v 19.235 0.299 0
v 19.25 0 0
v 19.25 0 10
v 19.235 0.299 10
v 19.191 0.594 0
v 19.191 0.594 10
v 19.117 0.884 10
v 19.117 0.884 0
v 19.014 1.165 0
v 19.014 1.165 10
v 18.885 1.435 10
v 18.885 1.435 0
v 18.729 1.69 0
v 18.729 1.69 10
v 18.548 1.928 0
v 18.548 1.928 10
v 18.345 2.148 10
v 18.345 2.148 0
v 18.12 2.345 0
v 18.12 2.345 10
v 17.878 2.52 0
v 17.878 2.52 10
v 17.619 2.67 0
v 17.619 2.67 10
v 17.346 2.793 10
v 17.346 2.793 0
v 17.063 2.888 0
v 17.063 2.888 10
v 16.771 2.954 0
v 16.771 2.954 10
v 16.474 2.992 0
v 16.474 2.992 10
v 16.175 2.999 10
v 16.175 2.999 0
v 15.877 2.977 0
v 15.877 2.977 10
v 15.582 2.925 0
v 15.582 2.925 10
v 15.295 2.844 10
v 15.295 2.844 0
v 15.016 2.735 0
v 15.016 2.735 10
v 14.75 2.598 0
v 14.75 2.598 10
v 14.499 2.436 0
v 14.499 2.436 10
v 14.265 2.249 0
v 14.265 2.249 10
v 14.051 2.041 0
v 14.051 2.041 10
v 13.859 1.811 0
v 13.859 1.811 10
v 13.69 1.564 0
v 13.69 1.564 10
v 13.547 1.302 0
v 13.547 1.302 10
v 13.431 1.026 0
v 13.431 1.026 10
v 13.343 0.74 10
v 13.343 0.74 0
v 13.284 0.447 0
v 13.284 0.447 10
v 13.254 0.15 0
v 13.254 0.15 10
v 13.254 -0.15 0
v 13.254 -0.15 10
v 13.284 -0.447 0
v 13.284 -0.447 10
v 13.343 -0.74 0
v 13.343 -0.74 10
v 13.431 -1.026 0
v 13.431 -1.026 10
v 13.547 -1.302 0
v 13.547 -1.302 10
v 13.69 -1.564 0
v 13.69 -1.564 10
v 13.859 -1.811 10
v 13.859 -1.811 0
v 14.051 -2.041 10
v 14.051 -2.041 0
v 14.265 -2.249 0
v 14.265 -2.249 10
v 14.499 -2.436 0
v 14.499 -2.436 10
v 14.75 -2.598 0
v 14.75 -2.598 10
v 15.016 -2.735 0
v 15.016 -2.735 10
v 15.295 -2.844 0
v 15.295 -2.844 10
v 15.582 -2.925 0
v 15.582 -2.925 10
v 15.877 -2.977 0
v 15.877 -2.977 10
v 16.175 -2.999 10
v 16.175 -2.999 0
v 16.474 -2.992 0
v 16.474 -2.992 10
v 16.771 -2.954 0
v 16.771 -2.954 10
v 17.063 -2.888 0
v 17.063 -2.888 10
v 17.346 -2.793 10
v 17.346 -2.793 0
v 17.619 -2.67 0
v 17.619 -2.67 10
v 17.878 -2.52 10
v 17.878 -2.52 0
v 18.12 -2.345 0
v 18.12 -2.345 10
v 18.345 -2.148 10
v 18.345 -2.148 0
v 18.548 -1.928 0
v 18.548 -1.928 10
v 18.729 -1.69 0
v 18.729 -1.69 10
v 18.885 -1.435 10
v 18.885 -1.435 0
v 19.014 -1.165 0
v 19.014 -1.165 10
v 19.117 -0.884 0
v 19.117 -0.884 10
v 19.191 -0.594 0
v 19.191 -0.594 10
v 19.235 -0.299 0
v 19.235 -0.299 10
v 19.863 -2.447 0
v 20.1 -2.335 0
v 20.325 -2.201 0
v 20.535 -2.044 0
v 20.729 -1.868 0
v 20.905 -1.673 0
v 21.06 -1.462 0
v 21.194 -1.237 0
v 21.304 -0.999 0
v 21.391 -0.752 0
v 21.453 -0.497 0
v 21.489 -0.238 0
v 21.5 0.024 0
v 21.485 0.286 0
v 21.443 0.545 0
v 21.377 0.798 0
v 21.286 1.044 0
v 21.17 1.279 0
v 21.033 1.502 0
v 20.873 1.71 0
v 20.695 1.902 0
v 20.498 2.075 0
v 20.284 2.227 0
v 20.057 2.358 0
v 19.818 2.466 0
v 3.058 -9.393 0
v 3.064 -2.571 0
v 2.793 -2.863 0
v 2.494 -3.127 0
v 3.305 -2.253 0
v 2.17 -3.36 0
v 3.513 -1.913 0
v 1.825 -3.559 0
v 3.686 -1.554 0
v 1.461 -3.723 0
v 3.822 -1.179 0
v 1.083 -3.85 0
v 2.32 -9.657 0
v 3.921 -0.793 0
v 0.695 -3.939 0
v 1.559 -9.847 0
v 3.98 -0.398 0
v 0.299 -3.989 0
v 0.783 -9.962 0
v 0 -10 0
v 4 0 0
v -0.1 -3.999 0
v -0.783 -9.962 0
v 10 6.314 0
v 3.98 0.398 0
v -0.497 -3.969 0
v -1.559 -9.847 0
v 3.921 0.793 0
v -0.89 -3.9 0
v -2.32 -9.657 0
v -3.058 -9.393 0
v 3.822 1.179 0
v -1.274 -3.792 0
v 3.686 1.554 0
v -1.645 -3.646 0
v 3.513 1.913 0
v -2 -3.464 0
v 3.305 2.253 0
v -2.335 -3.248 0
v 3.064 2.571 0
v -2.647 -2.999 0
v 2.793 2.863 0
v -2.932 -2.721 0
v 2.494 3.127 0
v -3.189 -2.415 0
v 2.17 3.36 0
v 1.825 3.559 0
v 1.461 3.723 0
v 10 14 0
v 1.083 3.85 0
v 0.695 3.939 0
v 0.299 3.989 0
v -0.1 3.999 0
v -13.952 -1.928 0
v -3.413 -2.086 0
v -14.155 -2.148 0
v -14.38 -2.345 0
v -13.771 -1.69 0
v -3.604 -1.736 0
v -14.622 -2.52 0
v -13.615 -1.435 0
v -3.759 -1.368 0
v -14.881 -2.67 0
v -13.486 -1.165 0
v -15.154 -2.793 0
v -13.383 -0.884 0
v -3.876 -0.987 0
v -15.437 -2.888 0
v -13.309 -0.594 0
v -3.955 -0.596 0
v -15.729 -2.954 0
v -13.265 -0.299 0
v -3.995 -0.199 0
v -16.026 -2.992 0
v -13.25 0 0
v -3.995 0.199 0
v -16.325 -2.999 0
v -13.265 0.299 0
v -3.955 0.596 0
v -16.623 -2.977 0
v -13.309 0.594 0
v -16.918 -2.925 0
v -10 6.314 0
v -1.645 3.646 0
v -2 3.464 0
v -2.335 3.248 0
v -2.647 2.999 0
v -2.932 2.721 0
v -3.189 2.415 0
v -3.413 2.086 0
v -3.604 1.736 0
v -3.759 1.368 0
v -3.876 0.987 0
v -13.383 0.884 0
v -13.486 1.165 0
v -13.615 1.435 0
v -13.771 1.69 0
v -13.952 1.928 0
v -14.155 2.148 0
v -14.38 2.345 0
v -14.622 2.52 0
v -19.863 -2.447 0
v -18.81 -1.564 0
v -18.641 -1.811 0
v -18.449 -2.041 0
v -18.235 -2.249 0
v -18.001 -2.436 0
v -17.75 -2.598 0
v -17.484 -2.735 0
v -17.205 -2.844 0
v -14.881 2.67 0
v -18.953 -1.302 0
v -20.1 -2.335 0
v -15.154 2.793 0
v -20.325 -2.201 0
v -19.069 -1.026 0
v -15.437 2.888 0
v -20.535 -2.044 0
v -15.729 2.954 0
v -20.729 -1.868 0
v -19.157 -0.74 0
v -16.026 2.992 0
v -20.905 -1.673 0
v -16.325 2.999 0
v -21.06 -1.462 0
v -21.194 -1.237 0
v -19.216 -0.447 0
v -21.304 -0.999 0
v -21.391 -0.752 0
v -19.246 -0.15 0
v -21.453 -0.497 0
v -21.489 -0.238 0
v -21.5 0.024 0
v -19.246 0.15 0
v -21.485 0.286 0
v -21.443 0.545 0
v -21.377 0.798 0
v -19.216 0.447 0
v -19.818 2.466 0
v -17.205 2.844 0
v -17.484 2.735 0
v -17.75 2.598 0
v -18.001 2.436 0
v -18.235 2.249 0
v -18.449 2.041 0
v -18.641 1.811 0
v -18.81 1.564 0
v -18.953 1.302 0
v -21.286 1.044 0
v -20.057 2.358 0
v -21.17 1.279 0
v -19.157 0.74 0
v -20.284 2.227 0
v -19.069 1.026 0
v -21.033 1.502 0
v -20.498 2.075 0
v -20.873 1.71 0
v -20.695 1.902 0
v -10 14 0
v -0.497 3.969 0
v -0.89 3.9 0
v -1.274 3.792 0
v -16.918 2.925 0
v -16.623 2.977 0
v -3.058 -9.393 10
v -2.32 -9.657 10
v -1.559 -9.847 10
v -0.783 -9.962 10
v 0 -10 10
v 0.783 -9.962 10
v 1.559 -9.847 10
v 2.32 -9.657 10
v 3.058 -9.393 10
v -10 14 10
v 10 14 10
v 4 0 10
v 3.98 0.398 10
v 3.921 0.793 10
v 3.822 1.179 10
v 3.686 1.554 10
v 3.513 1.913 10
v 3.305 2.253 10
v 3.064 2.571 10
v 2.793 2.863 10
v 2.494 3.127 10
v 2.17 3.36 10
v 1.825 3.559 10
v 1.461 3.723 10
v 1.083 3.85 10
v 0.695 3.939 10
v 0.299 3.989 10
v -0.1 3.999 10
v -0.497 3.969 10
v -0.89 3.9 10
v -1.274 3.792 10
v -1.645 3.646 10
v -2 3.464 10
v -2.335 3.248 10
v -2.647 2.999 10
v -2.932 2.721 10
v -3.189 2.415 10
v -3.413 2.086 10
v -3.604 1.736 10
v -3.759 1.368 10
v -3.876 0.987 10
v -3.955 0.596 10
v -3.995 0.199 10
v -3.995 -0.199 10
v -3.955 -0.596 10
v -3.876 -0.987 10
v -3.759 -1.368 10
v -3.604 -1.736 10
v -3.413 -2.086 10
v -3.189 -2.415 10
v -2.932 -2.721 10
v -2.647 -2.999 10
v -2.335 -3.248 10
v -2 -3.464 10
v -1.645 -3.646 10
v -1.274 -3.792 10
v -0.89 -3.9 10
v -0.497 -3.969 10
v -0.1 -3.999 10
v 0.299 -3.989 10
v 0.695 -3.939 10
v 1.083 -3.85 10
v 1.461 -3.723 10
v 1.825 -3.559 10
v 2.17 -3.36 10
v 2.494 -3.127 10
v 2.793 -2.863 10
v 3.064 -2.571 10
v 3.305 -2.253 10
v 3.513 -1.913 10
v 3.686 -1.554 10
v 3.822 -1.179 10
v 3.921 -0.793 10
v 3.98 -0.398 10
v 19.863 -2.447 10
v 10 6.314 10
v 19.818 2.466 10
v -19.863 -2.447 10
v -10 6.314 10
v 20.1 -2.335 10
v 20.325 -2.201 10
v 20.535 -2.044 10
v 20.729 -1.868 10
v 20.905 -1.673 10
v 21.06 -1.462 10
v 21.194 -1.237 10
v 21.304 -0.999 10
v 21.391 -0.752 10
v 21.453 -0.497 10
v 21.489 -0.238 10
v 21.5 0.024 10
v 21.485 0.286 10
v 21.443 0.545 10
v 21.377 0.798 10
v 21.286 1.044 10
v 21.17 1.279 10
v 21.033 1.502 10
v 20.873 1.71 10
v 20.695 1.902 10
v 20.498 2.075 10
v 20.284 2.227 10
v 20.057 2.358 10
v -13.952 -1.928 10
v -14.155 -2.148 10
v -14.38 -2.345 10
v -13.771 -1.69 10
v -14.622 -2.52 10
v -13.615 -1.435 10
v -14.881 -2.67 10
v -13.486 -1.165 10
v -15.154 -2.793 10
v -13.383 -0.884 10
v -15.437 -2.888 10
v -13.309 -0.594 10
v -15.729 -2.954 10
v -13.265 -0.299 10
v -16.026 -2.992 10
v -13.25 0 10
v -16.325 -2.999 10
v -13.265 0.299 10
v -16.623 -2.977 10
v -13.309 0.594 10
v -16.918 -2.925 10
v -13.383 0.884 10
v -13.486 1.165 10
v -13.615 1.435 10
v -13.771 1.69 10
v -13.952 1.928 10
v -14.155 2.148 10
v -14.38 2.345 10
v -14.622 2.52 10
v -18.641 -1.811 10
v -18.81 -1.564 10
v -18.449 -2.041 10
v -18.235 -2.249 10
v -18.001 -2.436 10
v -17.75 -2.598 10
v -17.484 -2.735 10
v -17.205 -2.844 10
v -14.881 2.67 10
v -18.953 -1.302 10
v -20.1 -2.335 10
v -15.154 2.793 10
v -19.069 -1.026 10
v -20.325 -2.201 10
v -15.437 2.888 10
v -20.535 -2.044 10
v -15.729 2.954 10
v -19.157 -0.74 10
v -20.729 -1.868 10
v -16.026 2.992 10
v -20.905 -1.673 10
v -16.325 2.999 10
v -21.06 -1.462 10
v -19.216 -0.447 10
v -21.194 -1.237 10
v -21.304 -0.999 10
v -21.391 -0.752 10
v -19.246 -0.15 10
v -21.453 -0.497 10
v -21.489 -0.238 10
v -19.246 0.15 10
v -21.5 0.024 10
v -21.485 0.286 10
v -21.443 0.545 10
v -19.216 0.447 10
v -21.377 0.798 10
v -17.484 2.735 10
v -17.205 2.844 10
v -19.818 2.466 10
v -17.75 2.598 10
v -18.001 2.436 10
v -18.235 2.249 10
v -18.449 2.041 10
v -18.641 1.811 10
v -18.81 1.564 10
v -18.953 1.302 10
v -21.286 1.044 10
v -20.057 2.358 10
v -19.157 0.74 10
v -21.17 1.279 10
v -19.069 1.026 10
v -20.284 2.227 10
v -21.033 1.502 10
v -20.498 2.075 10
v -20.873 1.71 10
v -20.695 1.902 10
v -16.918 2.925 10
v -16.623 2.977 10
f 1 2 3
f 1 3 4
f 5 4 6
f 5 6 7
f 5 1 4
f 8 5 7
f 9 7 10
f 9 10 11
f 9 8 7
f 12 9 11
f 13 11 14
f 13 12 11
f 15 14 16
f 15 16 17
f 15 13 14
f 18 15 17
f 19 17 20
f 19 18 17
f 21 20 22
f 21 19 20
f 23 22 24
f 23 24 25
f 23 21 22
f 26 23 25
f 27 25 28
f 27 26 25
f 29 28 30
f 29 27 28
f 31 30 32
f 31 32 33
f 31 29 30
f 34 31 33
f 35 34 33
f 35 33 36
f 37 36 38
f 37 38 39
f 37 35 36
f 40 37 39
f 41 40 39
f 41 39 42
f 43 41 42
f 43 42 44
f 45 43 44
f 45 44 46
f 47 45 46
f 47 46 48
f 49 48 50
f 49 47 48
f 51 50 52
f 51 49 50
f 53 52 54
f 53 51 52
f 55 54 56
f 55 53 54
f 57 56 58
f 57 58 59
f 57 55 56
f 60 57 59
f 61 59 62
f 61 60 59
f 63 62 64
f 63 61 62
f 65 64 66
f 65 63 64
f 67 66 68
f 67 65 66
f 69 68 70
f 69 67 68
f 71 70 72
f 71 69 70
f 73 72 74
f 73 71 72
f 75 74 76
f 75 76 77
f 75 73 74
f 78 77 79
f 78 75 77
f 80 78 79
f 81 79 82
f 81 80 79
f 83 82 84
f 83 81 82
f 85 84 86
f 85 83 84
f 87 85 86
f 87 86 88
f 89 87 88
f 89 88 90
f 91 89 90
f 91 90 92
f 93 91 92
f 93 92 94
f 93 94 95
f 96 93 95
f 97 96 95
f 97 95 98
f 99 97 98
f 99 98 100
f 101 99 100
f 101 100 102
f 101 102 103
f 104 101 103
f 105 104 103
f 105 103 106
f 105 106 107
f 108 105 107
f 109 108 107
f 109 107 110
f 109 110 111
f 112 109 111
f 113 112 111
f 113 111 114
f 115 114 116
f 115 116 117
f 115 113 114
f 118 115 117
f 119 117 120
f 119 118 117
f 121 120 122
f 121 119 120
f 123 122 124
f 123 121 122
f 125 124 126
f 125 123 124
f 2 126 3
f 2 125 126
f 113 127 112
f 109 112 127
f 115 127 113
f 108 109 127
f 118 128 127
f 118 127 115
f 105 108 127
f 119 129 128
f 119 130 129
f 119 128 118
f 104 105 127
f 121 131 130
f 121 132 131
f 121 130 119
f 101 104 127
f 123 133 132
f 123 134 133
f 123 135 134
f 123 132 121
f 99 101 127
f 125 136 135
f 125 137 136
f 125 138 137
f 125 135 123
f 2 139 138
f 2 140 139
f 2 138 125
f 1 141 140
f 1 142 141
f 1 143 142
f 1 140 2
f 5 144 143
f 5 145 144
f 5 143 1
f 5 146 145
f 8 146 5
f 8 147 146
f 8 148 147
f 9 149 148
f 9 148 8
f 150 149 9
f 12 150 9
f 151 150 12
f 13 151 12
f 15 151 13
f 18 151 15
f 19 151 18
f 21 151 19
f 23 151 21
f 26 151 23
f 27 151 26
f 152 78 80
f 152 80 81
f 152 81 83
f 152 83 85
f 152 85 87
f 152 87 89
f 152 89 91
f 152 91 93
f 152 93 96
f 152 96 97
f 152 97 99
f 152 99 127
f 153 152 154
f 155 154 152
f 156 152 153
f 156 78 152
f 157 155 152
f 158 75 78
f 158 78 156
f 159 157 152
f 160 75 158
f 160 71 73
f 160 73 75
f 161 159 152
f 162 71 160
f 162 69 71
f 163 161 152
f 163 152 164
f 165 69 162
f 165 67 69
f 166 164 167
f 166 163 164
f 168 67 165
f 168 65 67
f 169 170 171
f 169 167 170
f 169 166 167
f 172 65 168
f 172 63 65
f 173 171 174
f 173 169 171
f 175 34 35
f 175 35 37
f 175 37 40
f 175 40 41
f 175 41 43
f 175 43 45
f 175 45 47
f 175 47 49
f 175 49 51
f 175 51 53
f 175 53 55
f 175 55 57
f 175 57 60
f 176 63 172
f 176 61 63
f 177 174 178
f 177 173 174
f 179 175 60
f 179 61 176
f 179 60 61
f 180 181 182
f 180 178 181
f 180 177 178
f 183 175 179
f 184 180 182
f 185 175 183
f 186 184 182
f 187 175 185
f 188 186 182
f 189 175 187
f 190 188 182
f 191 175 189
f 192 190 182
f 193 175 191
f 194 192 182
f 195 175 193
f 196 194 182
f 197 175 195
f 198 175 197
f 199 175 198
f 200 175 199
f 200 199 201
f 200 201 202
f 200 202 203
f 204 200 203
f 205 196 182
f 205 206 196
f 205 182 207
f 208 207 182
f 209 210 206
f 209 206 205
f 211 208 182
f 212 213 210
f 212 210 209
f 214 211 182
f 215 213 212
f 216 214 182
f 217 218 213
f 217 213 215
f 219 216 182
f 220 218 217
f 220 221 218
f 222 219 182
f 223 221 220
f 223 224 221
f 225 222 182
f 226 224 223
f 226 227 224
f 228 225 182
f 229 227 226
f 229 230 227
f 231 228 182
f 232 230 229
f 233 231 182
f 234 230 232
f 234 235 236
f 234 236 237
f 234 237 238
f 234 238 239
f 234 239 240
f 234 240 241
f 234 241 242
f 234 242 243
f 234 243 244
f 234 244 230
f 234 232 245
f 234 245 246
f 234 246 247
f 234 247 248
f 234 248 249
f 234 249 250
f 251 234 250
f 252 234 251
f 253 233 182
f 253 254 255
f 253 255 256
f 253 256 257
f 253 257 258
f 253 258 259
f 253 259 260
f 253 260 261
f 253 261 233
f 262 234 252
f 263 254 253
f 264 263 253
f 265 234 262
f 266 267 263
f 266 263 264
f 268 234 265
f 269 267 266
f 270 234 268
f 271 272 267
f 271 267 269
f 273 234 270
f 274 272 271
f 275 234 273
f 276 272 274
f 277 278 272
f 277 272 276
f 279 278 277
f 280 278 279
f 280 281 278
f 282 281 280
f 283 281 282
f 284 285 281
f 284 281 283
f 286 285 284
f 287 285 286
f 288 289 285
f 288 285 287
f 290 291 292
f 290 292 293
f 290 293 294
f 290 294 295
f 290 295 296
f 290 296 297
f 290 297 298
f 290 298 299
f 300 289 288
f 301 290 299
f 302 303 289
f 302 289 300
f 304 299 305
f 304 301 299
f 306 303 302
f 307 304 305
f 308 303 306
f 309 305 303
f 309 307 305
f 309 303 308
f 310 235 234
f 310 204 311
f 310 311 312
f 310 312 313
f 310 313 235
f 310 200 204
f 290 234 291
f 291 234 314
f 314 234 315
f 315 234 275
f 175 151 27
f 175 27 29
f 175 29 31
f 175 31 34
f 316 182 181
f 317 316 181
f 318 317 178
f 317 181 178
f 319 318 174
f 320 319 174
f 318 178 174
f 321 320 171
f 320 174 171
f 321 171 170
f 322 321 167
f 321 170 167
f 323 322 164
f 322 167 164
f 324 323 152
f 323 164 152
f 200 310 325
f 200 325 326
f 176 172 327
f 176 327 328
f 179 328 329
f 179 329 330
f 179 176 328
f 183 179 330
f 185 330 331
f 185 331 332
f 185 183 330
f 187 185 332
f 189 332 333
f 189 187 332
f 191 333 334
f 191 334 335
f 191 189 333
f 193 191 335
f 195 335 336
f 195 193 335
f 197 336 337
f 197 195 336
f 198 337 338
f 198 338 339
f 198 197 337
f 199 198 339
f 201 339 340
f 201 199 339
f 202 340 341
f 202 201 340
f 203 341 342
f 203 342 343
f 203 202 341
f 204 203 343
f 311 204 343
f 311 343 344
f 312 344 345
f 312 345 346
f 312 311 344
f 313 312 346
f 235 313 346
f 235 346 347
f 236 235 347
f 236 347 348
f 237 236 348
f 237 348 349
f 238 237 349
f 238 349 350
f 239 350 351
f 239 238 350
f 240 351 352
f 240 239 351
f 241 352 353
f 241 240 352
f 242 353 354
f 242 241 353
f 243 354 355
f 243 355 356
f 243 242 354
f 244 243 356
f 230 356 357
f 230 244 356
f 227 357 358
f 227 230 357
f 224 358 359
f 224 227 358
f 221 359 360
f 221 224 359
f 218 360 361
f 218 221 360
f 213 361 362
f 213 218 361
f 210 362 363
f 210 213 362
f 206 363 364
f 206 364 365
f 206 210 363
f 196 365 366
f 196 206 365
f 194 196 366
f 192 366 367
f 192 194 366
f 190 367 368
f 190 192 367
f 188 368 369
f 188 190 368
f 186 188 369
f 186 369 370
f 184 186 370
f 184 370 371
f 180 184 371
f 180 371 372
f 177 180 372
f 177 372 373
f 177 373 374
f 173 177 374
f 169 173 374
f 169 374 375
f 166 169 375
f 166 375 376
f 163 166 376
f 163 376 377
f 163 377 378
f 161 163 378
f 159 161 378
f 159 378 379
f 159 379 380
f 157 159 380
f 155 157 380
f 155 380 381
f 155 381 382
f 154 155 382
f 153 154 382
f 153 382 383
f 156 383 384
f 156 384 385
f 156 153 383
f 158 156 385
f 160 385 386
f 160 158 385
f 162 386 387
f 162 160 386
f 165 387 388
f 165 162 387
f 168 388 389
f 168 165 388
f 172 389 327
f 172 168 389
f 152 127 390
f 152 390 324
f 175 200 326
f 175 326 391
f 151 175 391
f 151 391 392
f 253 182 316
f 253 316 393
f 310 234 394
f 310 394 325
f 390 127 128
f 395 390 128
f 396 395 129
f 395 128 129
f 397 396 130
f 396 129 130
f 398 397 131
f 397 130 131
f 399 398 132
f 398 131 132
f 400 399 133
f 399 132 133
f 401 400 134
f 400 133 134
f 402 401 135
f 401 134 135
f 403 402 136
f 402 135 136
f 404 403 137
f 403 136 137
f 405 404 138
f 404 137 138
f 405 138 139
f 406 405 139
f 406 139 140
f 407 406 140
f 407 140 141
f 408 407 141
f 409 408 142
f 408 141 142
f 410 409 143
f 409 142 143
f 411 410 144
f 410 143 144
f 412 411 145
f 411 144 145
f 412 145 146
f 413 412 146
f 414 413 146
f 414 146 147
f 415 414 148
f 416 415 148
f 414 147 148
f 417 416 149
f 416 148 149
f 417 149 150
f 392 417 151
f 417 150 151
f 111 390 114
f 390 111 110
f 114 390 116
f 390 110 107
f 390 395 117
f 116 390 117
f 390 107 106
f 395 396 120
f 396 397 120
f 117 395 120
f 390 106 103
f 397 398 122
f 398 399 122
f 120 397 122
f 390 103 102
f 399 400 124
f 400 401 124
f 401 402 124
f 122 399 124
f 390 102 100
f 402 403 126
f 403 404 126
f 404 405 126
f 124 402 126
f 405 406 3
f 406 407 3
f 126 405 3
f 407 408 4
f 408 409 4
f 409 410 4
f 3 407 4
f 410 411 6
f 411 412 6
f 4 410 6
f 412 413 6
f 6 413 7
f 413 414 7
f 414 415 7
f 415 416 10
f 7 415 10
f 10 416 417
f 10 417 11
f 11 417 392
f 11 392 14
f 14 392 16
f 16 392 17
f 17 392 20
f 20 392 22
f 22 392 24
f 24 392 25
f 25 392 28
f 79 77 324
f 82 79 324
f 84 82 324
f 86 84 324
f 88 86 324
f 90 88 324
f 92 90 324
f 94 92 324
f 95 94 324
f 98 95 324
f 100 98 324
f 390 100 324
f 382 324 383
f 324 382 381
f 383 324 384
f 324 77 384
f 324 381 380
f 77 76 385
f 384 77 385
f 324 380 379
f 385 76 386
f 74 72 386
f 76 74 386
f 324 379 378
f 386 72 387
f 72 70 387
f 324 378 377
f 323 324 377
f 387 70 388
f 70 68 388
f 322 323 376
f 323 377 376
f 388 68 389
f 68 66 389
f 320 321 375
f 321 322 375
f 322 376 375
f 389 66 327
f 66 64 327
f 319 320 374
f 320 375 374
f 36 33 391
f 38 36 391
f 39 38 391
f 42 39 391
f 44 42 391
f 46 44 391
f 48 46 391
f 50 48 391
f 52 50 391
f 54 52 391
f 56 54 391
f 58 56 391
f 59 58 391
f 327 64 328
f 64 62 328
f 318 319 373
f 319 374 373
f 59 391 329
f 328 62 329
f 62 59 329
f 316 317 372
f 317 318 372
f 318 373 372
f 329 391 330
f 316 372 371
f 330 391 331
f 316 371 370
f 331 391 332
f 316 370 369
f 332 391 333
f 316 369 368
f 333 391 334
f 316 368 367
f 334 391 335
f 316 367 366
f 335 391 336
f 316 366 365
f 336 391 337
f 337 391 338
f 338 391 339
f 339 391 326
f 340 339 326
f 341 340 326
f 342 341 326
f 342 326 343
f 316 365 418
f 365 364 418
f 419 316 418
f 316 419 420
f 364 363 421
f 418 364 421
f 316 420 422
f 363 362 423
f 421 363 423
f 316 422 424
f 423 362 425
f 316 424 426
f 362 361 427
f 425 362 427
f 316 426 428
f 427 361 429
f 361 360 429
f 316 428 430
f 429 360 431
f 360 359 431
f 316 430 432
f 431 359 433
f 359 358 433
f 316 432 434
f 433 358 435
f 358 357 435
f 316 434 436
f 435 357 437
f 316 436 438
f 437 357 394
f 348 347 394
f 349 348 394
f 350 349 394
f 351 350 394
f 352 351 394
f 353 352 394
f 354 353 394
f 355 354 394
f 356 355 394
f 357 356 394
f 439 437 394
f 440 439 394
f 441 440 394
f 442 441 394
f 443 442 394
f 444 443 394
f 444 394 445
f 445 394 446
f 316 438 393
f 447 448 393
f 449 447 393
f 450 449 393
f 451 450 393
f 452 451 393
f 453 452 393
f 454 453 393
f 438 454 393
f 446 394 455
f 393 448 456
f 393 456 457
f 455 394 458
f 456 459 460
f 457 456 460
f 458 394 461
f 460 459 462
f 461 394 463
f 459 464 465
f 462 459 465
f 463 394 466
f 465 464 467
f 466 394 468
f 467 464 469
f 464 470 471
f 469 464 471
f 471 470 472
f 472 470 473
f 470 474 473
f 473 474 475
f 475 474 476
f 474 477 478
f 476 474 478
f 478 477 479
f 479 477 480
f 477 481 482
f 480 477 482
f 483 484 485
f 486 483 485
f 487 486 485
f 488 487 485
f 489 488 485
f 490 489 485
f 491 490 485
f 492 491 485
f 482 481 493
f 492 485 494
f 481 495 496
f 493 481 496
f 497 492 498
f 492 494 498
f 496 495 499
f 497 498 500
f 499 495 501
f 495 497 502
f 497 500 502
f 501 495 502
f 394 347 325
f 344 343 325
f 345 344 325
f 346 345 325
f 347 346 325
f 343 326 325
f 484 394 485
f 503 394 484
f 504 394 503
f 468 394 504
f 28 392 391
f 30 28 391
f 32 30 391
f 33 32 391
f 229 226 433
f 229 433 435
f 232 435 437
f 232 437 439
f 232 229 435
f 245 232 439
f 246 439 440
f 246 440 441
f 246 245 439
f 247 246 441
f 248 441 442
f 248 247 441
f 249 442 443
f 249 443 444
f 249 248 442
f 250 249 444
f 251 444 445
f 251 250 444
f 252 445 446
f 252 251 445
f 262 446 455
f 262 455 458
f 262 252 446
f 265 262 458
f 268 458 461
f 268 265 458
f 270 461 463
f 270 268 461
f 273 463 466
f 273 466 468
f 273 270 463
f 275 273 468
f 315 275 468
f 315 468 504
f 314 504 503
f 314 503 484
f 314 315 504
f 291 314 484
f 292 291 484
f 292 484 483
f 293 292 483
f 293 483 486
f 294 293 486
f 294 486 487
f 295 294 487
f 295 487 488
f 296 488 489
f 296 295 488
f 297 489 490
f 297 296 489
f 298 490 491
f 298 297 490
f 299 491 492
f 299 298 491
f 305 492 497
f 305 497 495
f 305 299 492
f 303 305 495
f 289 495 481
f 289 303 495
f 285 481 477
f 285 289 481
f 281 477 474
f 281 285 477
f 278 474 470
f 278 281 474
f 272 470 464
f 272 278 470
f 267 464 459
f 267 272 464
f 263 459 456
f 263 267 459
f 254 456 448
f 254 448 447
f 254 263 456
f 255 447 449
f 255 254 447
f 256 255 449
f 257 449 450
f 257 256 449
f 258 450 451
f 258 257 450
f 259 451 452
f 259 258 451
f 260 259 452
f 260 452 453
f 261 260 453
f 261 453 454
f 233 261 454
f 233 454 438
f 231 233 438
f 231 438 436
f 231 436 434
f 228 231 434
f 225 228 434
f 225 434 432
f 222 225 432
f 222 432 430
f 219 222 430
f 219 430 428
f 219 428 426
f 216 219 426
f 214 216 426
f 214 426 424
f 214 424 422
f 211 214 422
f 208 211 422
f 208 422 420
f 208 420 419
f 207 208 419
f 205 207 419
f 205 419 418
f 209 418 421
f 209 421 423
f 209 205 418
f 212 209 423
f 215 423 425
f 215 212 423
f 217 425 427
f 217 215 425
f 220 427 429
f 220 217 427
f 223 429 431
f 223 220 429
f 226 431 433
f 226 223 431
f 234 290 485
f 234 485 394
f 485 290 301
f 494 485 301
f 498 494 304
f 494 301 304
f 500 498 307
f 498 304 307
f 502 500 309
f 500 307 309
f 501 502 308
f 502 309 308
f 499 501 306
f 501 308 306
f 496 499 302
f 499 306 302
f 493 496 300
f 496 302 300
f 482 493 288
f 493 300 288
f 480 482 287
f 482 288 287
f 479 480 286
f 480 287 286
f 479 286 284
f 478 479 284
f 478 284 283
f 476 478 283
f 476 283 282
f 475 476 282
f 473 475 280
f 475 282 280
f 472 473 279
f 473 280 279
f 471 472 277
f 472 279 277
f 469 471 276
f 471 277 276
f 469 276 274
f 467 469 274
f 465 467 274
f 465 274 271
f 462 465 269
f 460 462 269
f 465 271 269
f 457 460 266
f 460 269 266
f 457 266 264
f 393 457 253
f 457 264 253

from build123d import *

# Parameters (mm, degrees)
SKETCH_R   = 4
SKETCH_R_2 = 3
PAD_DEPTH  = 10


with BuildPart() as part:
    # Sketch → Pad (new body)
    with BuildSketch(Plane.XY):
        with BuildLine():
            Line((-19.818265, 2.465513), (-10, 6.314027))
            Line((-10, 6.314027), (-10, 14))
            Line((-10, 14), (10, 14))
            Line((10, 14), (10, 6.314027))
            Line((10, 6.314027), (19.818265, 2.465513))
            ThreePointArc((19.863348, -2.447363), (21.499889, 0.0243), (19.818265, 2.465513))
            Line((19.863348, -2.447363), (3.058498, -9.392862))
            ThreePointArc((-3.058498, -9.392862), (0, -10), (3.058498, -9.392862))
            Line((-3.058498, -9.392862), (-19.863348, -2.447363))
            ThreePointArc((-19.818265, 2.465513), (-21.499889, 0.0243), (-19.863348, -2.447363))
        make_face()
        Circle(SKETCH_R, mode=Mode.SUBTRACT)
        with Locations((-16.25, 0)):
            Circle(SKETCH_R_2, mode=Mode.SUBTRACT)
        with Locations((16.25, 0)):
            Circle(SKETCH_R_2, mode=Mode.SUBTRACT)
    extrude(amount=PAD_DEPTH)


solid = part.part
